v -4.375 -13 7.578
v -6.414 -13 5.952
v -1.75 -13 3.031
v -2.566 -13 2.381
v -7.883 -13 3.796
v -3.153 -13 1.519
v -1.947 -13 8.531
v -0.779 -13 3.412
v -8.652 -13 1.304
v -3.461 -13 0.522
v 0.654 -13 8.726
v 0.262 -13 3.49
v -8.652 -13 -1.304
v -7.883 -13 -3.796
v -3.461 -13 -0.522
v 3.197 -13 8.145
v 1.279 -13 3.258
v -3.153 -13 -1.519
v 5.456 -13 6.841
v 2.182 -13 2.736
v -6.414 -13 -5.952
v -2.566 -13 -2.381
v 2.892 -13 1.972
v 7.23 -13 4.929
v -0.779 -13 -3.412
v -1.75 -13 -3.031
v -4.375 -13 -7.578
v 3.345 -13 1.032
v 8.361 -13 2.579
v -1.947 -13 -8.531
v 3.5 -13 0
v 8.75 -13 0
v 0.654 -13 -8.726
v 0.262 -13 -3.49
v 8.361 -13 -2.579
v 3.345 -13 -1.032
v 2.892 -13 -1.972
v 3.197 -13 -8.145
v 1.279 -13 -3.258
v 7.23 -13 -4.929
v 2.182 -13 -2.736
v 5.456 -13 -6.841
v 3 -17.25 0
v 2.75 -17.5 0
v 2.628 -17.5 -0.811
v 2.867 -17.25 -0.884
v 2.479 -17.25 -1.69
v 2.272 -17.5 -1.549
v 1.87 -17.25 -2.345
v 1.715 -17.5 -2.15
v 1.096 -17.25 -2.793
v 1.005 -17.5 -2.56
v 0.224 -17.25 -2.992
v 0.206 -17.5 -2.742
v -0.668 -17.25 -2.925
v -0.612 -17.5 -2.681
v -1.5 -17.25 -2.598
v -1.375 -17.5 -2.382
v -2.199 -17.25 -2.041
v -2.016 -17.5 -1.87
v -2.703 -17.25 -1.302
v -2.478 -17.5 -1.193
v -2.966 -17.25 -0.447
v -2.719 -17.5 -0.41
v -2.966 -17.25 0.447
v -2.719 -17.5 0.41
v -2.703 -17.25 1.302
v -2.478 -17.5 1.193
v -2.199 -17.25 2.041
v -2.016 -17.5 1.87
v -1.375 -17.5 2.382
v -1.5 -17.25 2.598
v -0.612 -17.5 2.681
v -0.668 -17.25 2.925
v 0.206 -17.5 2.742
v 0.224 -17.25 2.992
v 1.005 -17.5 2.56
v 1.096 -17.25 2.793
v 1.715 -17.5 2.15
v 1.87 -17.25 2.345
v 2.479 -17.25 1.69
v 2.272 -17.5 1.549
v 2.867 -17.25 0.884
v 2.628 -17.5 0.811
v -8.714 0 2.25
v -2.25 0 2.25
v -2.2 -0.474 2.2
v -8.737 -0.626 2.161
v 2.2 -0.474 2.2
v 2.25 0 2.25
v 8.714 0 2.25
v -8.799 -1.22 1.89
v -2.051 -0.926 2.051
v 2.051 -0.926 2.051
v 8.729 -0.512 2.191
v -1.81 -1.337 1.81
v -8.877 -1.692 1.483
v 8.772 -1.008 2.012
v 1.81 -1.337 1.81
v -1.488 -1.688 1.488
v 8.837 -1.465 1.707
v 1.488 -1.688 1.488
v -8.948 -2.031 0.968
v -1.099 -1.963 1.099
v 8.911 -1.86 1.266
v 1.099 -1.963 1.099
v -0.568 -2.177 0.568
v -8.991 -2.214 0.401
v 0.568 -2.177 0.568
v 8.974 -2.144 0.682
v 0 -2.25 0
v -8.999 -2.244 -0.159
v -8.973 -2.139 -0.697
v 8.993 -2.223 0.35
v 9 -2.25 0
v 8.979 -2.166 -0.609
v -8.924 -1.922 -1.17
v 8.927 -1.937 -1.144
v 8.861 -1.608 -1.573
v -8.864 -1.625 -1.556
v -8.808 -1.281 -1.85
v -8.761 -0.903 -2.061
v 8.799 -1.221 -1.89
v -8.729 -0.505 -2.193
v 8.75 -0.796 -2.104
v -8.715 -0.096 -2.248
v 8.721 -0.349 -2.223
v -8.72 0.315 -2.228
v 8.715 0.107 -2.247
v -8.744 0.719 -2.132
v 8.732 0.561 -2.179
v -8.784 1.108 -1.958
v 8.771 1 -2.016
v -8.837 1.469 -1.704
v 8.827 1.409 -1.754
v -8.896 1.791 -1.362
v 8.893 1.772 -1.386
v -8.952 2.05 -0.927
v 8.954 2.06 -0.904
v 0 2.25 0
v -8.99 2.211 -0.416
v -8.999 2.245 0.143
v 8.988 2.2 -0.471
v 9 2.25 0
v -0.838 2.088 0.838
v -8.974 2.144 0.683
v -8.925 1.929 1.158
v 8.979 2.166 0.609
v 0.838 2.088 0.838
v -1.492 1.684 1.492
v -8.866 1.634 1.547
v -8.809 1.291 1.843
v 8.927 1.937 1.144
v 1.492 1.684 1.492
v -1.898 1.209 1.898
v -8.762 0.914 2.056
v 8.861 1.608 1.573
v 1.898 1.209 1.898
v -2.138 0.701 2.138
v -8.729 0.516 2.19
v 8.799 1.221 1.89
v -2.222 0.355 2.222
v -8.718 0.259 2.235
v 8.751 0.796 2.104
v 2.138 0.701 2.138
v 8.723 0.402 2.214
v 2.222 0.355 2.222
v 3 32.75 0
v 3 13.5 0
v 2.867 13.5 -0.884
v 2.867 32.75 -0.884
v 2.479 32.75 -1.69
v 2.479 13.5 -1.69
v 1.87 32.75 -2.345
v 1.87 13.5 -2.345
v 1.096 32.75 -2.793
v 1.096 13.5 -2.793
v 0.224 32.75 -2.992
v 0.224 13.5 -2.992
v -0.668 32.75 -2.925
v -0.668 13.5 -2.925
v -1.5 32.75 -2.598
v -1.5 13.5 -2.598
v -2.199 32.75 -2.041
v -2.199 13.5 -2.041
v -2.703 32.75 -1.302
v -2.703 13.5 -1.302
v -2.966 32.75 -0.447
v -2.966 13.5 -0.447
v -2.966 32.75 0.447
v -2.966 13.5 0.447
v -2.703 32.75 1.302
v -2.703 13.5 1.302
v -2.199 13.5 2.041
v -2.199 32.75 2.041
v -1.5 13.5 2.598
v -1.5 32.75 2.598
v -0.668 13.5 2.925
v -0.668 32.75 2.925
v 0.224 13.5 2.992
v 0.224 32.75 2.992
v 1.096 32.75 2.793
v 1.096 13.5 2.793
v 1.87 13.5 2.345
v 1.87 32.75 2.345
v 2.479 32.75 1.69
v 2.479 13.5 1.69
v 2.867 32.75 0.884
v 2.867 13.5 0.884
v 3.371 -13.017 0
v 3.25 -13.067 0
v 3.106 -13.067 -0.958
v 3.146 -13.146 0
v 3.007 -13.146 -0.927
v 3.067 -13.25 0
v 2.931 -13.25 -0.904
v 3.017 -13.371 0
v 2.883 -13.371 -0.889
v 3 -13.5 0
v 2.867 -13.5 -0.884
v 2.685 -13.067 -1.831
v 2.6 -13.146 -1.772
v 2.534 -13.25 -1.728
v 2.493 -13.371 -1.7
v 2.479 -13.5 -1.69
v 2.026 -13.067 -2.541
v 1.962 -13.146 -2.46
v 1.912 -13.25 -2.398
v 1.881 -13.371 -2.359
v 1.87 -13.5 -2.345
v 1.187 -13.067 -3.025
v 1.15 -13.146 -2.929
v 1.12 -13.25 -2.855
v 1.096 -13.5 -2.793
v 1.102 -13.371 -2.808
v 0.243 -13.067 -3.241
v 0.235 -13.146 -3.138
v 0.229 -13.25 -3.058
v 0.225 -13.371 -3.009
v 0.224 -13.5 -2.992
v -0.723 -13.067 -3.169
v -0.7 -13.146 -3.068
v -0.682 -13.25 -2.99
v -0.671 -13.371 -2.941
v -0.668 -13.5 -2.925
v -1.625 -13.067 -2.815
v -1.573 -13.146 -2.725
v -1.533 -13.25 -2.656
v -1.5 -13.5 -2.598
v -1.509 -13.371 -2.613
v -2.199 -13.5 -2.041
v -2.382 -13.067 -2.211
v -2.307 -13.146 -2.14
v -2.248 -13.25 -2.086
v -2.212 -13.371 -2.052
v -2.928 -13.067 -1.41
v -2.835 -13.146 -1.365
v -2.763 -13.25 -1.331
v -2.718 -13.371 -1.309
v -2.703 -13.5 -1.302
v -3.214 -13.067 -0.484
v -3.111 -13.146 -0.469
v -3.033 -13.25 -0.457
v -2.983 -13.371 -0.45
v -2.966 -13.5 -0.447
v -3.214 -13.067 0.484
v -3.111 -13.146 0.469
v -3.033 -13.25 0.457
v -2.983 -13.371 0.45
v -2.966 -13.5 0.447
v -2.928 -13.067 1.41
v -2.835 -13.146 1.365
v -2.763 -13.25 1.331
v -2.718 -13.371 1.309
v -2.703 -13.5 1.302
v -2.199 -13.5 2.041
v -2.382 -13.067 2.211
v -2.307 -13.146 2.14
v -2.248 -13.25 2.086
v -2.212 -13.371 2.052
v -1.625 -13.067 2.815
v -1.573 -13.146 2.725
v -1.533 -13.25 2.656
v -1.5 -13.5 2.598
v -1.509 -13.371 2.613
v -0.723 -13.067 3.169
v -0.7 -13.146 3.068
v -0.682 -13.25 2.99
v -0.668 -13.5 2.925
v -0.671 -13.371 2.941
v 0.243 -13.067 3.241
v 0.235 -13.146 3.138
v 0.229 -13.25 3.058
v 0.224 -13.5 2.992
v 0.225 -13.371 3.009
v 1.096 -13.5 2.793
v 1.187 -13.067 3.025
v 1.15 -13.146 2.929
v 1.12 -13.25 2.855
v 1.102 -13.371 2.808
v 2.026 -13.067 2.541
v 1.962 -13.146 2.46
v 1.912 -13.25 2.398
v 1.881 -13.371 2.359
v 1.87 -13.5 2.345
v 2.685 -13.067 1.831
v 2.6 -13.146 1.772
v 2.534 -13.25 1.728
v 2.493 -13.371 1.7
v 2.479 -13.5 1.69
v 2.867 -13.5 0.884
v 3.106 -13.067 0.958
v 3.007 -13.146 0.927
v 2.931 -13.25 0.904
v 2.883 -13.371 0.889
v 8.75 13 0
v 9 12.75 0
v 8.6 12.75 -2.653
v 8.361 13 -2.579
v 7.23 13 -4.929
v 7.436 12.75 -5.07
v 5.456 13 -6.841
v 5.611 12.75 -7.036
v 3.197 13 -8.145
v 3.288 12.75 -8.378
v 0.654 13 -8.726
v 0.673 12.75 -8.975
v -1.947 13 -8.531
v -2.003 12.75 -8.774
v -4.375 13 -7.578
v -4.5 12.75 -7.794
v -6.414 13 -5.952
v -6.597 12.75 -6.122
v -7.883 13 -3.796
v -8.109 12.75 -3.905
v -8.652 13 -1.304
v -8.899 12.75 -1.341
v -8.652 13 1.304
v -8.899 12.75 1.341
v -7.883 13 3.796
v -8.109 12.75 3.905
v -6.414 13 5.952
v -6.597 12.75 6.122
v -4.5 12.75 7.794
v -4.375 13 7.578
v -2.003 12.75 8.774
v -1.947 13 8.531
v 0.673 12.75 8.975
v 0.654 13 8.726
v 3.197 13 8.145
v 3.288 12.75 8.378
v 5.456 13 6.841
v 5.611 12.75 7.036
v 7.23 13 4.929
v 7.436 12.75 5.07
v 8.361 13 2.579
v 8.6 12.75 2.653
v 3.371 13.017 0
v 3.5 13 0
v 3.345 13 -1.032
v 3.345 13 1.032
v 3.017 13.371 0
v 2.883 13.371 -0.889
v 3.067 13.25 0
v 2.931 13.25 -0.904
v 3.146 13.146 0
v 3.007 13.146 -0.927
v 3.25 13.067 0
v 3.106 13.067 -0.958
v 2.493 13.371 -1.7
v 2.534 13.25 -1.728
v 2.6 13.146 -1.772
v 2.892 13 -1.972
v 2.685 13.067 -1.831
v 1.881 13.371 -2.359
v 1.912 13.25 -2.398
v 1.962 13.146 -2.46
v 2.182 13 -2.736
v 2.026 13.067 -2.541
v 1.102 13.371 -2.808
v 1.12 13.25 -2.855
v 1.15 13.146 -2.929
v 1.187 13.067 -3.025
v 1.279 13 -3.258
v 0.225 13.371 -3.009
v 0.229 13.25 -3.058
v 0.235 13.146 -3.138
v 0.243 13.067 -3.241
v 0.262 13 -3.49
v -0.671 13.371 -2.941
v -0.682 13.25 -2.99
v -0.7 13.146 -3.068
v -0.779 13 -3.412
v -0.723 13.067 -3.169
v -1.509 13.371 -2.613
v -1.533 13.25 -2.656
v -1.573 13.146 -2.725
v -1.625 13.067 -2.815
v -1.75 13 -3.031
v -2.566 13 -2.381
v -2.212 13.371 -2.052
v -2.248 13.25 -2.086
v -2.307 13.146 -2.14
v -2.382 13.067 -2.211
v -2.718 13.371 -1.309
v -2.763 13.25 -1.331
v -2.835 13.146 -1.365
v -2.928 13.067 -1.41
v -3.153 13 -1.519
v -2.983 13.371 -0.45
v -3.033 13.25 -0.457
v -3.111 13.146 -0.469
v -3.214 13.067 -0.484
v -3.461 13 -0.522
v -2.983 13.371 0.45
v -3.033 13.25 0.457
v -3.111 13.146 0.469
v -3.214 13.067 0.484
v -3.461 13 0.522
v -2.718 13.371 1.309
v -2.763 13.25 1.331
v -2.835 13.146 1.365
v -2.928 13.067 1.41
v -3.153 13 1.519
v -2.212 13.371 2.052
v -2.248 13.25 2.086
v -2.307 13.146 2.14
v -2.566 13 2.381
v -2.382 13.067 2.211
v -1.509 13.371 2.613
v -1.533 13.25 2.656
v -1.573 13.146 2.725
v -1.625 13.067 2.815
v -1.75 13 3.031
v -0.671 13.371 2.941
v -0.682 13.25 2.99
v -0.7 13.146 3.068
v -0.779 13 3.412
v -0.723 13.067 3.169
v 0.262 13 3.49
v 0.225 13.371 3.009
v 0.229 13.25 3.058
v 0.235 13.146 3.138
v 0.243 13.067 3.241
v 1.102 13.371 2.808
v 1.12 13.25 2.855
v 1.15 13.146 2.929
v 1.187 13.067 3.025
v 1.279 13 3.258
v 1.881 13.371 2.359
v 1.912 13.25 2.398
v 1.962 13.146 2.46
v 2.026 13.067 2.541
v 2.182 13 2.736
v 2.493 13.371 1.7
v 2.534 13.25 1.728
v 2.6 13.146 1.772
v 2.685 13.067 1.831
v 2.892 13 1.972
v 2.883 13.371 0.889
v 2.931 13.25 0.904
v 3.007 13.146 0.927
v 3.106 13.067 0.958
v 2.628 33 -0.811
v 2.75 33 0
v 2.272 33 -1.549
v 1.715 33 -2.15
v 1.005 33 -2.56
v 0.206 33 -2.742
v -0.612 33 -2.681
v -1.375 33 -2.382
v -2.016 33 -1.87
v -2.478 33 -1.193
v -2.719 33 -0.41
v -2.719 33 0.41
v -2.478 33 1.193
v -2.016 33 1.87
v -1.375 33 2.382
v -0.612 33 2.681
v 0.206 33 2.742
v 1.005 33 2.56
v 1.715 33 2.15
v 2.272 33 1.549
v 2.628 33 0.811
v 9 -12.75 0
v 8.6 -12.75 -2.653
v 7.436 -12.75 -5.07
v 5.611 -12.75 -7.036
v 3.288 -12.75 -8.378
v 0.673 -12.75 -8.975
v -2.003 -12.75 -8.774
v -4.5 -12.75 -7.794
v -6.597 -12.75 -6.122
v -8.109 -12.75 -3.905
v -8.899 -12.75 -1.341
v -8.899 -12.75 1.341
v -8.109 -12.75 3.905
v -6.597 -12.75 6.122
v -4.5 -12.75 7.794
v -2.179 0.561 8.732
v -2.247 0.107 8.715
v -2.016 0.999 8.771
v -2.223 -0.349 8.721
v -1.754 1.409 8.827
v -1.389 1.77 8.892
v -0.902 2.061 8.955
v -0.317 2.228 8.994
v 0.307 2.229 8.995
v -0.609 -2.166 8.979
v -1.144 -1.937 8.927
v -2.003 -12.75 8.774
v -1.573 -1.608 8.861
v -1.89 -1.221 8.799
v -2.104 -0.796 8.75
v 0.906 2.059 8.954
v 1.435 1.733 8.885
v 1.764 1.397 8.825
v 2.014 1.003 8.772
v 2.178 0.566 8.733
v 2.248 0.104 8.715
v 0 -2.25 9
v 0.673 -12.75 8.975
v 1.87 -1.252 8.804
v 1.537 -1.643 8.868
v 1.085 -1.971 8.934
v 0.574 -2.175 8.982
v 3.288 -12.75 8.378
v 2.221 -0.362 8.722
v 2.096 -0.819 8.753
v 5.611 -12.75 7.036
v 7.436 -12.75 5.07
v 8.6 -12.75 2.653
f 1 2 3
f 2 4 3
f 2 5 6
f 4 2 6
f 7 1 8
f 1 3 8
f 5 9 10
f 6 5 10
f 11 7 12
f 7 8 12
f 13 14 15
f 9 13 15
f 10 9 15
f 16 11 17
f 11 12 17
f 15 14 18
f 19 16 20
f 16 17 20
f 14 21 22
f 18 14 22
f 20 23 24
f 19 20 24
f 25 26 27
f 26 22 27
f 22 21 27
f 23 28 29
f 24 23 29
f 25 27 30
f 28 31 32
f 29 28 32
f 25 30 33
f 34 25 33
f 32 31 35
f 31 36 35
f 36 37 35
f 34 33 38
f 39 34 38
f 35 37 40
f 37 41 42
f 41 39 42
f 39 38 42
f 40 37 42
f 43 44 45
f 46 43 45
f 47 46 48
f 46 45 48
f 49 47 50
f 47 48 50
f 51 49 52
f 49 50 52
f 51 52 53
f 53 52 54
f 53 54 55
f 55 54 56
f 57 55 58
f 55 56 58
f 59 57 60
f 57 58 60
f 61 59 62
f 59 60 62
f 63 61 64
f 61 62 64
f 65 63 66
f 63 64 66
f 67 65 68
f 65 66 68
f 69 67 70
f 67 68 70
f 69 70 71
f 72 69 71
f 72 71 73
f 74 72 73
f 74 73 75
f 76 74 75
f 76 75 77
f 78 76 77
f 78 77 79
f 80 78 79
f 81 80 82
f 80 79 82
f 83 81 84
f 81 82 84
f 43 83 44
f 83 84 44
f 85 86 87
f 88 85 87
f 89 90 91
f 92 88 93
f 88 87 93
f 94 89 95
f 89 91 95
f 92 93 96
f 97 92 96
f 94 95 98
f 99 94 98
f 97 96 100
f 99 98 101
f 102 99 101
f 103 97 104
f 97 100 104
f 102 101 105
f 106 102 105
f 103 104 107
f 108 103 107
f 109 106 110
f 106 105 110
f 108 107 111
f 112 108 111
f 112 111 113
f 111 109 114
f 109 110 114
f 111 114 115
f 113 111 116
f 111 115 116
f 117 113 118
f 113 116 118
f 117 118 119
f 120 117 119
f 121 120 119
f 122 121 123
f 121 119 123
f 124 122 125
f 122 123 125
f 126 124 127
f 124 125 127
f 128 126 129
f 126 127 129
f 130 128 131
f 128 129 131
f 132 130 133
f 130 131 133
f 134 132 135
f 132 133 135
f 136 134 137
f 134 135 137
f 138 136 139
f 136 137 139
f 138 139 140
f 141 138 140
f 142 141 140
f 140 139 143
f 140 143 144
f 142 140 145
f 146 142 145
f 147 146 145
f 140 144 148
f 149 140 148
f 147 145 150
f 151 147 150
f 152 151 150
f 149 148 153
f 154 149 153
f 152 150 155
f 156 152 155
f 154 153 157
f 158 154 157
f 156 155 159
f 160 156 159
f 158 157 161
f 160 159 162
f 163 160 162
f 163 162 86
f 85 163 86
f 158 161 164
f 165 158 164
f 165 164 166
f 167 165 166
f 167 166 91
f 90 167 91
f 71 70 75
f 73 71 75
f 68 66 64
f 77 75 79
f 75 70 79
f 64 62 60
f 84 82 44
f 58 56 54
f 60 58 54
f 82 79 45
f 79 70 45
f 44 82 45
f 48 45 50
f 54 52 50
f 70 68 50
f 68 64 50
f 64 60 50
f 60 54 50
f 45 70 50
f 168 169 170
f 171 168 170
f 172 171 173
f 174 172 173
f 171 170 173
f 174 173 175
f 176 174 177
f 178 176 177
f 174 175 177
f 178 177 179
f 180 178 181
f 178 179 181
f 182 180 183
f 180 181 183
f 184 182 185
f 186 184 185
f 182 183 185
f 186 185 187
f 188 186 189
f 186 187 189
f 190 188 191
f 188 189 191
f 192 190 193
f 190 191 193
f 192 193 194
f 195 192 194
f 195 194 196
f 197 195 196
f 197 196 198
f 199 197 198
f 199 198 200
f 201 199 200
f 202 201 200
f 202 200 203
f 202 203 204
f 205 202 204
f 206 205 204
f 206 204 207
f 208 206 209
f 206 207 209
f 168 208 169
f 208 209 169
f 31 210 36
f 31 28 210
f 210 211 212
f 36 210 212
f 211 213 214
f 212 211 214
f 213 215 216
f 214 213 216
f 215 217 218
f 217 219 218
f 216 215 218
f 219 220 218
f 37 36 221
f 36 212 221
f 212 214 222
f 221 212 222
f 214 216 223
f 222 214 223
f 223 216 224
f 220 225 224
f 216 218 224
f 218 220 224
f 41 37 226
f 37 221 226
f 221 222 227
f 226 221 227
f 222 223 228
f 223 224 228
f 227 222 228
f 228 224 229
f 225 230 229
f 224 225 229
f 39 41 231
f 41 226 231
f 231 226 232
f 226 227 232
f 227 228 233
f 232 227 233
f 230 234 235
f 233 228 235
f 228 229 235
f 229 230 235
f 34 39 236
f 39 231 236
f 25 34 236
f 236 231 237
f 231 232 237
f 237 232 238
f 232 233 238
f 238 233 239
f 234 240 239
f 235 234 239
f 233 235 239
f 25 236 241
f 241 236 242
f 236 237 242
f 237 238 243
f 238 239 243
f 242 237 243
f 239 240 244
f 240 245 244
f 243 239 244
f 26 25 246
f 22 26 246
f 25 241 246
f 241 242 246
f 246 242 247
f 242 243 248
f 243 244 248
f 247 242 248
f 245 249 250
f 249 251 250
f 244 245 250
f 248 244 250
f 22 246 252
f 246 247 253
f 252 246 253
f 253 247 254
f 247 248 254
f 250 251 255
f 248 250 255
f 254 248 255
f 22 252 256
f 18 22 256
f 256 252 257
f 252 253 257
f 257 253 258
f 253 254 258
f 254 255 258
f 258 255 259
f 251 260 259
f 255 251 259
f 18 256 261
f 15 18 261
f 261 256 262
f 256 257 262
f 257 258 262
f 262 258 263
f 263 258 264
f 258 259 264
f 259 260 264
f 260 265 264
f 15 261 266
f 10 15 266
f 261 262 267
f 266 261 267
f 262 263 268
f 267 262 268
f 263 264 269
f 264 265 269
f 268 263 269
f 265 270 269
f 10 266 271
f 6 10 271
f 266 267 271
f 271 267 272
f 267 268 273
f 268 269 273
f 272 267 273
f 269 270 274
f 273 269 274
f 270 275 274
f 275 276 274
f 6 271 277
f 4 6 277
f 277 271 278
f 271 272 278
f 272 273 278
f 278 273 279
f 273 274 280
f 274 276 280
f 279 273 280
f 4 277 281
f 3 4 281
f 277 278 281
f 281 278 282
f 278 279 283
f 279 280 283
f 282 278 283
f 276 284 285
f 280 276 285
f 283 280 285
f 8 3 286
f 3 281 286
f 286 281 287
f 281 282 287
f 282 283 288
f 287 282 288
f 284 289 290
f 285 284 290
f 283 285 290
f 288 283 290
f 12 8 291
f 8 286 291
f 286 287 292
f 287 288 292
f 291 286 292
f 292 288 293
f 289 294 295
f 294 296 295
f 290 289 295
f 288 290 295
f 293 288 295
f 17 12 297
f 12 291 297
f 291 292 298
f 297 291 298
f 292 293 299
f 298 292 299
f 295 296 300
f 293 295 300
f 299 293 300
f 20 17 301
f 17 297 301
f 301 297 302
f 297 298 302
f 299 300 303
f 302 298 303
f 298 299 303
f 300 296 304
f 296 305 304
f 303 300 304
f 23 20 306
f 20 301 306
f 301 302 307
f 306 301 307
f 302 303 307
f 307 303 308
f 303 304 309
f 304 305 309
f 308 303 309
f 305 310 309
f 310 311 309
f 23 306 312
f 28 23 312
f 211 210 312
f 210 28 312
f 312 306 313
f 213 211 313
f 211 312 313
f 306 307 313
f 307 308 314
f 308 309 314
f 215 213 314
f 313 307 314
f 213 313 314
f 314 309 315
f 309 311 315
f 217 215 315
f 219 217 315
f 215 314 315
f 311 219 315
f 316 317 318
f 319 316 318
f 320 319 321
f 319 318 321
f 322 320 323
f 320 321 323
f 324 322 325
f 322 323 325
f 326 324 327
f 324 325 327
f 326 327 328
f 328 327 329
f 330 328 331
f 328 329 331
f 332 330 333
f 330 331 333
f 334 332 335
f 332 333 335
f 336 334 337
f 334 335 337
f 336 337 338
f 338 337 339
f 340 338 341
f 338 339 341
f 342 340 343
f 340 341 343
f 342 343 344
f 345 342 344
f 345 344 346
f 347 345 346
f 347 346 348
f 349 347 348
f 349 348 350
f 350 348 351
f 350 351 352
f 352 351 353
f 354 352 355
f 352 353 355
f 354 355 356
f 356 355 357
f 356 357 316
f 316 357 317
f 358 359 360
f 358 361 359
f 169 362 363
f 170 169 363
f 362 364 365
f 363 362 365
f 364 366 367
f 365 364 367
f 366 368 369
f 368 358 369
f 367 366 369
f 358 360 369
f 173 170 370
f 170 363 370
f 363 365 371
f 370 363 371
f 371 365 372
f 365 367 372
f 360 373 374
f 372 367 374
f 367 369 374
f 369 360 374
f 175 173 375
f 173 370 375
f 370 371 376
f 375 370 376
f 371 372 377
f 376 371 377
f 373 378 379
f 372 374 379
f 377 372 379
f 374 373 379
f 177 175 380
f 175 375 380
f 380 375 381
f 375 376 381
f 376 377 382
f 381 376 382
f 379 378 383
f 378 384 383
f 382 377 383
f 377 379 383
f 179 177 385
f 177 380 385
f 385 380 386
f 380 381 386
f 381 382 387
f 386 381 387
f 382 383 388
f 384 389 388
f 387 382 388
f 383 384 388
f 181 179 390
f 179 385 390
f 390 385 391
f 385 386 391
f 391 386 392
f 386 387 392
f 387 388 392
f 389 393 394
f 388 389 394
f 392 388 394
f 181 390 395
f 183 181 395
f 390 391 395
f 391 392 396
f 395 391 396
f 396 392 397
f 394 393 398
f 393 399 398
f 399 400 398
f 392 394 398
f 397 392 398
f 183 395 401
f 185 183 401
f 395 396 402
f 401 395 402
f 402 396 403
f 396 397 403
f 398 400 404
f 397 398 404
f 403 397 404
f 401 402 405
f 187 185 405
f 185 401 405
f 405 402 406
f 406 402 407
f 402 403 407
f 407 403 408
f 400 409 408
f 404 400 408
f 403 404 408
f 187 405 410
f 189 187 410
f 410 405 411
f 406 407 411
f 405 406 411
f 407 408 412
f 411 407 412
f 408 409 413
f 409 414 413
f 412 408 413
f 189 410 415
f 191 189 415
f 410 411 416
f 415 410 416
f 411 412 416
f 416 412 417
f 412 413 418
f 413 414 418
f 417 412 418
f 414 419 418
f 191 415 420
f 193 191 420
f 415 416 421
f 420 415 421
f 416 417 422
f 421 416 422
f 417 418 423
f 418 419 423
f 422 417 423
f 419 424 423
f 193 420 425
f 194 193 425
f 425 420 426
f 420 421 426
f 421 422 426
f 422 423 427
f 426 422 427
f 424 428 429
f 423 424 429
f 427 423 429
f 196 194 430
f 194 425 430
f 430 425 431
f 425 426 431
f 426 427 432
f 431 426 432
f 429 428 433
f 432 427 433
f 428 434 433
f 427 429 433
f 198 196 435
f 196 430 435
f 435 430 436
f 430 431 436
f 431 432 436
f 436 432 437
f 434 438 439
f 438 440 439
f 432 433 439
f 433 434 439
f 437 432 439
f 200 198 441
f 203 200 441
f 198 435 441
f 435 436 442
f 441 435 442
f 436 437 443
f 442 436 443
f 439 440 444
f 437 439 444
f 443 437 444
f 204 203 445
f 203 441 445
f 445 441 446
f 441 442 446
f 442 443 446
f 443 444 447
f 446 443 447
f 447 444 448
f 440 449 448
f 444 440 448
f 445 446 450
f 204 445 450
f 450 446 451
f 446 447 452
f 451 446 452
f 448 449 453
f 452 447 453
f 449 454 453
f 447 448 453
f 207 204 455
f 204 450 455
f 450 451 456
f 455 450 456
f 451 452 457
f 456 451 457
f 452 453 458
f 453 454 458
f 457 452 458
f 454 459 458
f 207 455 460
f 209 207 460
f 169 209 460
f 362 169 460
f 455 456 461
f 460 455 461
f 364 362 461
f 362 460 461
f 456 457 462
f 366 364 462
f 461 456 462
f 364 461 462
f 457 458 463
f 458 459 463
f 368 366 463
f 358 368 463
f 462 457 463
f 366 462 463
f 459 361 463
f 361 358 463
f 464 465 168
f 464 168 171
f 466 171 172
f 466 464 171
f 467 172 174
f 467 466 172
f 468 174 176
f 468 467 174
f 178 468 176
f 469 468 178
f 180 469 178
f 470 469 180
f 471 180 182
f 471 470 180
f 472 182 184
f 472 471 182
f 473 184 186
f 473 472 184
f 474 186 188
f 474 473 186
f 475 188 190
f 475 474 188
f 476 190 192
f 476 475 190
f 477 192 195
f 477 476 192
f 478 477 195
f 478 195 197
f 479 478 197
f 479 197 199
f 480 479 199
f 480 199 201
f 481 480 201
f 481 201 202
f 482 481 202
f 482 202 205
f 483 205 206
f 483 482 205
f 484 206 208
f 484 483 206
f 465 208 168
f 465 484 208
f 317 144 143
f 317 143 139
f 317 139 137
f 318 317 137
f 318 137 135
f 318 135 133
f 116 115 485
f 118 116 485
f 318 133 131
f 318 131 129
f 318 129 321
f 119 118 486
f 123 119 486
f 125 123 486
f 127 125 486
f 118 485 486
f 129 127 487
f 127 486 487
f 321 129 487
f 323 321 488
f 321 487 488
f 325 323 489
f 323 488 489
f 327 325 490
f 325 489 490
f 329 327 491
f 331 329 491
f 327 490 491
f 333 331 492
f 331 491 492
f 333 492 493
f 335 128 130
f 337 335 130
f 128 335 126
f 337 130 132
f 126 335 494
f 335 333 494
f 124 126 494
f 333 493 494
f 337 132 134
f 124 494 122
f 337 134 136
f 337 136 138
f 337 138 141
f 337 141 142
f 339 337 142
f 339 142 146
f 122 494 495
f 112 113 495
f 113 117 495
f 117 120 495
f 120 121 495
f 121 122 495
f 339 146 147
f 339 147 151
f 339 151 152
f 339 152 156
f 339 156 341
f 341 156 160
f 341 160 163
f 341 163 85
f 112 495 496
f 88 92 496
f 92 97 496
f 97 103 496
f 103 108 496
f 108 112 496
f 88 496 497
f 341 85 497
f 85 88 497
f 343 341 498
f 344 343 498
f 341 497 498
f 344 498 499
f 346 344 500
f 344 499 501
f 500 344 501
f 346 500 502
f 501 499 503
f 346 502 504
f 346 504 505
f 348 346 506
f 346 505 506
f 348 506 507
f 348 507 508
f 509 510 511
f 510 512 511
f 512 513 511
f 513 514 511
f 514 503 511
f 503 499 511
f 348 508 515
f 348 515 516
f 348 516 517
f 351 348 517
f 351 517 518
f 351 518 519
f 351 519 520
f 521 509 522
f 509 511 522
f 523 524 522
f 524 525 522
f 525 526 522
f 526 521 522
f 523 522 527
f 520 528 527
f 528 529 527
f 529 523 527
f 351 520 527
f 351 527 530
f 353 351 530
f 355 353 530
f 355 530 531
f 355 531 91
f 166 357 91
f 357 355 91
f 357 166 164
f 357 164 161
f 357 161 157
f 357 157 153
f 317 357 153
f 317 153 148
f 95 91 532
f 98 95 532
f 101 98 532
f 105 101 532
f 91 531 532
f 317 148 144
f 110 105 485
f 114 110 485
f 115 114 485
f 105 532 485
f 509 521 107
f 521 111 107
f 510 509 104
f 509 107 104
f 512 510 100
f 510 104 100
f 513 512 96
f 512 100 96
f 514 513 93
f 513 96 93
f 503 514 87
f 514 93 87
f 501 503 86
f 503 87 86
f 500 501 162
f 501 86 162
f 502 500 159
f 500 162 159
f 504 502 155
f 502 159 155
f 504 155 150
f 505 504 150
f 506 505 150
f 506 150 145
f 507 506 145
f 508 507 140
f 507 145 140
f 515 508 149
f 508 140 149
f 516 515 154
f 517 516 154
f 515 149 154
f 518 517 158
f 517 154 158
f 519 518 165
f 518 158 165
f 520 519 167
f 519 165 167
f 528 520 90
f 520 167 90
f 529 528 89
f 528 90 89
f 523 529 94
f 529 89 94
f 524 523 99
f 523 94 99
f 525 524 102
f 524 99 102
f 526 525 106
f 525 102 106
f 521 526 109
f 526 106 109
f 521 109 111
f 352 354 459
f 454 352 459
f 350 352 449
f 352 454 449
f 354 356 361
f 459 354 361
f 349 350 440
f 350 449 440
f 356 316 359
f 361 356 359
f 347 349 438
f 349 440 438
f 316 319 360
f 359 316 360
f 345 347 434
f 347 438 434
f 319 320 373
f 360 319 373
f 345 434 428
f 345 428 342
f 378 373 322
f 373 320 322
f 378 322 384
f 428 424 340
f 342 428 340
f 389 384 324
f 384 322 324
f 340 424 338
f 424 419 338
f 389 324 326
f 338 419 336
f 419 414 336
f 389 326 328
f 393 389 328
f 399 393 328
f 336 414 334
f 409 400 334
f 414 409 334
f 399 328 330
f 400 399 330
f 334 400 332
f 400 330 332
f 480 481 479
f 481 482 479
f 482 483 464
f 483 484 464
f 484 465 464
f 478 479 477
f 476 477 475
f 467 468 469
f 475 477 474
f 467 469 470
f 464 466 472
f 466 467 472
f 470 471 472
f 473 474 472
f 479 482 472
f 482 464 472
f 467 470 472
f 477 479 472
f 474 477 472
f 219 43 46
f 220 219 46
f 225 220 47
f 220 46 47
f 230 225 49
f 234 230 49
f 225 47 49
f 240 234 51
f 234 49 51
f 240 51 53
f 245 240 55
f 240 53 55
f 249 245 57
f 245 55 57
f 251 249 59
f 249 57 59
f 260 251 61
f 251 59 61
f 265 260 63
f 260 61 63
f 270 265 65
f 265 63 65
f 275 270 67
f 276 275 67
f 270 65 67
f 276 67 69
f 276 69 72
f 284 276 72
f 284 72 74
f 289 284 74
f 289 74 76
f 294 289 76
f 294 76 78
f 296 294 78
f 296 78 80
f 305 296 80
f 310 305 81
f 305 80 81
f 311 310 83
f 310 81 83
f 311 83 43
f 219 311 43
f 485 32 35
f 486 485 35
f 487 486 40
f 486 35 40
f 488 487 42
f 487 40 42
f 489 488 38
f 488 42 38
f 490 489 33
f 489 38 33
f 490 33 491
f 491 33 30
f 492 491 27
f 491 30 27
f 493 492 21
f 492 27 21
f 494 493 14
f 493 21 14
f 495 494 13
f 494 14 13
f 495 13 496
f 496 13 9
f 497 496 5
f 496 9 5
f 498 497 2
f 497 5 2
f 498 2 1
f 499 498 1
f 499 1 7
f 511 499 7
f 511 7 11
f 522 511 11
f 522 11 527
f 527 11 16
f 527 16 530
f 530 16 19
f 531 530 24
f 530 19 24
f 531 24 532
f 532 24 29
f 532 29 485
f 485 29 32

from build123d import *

# Parameters (mm, degrees)
FURO_DE_DI_METRO_4_5_4_5_2_D = 4.5
ESBO_O8_W                    = 2.25
ESBO_O8_H                    = 9
FILLET1_R                    = 0.5
CHAMFER1_SIZE                = 0.25
CHAMFER4_SIZE                = 0.25


with BuildPart() as part:
    # Esboço1 → Revolução1 (revolve)
    with BuildSketch(Plane.XY):
        Polygon((0, 33), (3, 33), (3, 13), (9, 13), (9, -13), (3, -13), (3, -17.5), (0, -17.5), (0, 0), align=None)
    revolve(axis=Axis((0, 0, 0), (0, 1, 0)))

    # Furo de diâmetro Ø4.5 (4.5)2 (through all)
    with Locations(Plane(origin=(-9, 0, 0), x_dir=(0, 0, -1), z_dir=(-1, 0, 0))):
        with Locations((0, 0)):
            Hole(FURO_DE_DI_METRO_4_5_4_5_2_D / 2)

    # Esboço8 → Furo de diâmetro Ø4.5 (4.5)1 (revolve, cut)
    with BuildSketch(Plane(origin=(0, 0, 9), x_dir=(0, -1, 0), z_dir=(1, 0, 0))):
        with Locations((1.125, 4.5)):
            Rectangle(ESBO_O8_W, ESBO_O8_H)
    revolve(axis=Axis((0, 0, 15.35), (0, 0, -1)), mode=Mode.SUBTRACT)

    # Fillet1
    fillet1_edges = [part.edges().sort_by_distance(p)[0] for p in [
        (-3, -13, 0),
        (-3, 13, 0),
    ]]
    fillet(fillet1_edges, radius=FILLET1_R)

    # Chamfer1
    chamfer1_edges = [part.edges().sort_by_distance(p)[0] for p in [
        (-3, -17.5, 0),
        (-3, 33, 0),
    ]]
    chamfer(chamfer1_edges, length=CHAMFER1_SIZE)

    # Chamfer4
    chamfer4_edges = [part.edges().sort_by_distance(p)[0] for p in [
        (-9, -13, 0),
        (-9, 13, 0),
    ]]
    chamfer(chamfer4_edges, length=CHAMFER4_SIZE)


solid = part.part
